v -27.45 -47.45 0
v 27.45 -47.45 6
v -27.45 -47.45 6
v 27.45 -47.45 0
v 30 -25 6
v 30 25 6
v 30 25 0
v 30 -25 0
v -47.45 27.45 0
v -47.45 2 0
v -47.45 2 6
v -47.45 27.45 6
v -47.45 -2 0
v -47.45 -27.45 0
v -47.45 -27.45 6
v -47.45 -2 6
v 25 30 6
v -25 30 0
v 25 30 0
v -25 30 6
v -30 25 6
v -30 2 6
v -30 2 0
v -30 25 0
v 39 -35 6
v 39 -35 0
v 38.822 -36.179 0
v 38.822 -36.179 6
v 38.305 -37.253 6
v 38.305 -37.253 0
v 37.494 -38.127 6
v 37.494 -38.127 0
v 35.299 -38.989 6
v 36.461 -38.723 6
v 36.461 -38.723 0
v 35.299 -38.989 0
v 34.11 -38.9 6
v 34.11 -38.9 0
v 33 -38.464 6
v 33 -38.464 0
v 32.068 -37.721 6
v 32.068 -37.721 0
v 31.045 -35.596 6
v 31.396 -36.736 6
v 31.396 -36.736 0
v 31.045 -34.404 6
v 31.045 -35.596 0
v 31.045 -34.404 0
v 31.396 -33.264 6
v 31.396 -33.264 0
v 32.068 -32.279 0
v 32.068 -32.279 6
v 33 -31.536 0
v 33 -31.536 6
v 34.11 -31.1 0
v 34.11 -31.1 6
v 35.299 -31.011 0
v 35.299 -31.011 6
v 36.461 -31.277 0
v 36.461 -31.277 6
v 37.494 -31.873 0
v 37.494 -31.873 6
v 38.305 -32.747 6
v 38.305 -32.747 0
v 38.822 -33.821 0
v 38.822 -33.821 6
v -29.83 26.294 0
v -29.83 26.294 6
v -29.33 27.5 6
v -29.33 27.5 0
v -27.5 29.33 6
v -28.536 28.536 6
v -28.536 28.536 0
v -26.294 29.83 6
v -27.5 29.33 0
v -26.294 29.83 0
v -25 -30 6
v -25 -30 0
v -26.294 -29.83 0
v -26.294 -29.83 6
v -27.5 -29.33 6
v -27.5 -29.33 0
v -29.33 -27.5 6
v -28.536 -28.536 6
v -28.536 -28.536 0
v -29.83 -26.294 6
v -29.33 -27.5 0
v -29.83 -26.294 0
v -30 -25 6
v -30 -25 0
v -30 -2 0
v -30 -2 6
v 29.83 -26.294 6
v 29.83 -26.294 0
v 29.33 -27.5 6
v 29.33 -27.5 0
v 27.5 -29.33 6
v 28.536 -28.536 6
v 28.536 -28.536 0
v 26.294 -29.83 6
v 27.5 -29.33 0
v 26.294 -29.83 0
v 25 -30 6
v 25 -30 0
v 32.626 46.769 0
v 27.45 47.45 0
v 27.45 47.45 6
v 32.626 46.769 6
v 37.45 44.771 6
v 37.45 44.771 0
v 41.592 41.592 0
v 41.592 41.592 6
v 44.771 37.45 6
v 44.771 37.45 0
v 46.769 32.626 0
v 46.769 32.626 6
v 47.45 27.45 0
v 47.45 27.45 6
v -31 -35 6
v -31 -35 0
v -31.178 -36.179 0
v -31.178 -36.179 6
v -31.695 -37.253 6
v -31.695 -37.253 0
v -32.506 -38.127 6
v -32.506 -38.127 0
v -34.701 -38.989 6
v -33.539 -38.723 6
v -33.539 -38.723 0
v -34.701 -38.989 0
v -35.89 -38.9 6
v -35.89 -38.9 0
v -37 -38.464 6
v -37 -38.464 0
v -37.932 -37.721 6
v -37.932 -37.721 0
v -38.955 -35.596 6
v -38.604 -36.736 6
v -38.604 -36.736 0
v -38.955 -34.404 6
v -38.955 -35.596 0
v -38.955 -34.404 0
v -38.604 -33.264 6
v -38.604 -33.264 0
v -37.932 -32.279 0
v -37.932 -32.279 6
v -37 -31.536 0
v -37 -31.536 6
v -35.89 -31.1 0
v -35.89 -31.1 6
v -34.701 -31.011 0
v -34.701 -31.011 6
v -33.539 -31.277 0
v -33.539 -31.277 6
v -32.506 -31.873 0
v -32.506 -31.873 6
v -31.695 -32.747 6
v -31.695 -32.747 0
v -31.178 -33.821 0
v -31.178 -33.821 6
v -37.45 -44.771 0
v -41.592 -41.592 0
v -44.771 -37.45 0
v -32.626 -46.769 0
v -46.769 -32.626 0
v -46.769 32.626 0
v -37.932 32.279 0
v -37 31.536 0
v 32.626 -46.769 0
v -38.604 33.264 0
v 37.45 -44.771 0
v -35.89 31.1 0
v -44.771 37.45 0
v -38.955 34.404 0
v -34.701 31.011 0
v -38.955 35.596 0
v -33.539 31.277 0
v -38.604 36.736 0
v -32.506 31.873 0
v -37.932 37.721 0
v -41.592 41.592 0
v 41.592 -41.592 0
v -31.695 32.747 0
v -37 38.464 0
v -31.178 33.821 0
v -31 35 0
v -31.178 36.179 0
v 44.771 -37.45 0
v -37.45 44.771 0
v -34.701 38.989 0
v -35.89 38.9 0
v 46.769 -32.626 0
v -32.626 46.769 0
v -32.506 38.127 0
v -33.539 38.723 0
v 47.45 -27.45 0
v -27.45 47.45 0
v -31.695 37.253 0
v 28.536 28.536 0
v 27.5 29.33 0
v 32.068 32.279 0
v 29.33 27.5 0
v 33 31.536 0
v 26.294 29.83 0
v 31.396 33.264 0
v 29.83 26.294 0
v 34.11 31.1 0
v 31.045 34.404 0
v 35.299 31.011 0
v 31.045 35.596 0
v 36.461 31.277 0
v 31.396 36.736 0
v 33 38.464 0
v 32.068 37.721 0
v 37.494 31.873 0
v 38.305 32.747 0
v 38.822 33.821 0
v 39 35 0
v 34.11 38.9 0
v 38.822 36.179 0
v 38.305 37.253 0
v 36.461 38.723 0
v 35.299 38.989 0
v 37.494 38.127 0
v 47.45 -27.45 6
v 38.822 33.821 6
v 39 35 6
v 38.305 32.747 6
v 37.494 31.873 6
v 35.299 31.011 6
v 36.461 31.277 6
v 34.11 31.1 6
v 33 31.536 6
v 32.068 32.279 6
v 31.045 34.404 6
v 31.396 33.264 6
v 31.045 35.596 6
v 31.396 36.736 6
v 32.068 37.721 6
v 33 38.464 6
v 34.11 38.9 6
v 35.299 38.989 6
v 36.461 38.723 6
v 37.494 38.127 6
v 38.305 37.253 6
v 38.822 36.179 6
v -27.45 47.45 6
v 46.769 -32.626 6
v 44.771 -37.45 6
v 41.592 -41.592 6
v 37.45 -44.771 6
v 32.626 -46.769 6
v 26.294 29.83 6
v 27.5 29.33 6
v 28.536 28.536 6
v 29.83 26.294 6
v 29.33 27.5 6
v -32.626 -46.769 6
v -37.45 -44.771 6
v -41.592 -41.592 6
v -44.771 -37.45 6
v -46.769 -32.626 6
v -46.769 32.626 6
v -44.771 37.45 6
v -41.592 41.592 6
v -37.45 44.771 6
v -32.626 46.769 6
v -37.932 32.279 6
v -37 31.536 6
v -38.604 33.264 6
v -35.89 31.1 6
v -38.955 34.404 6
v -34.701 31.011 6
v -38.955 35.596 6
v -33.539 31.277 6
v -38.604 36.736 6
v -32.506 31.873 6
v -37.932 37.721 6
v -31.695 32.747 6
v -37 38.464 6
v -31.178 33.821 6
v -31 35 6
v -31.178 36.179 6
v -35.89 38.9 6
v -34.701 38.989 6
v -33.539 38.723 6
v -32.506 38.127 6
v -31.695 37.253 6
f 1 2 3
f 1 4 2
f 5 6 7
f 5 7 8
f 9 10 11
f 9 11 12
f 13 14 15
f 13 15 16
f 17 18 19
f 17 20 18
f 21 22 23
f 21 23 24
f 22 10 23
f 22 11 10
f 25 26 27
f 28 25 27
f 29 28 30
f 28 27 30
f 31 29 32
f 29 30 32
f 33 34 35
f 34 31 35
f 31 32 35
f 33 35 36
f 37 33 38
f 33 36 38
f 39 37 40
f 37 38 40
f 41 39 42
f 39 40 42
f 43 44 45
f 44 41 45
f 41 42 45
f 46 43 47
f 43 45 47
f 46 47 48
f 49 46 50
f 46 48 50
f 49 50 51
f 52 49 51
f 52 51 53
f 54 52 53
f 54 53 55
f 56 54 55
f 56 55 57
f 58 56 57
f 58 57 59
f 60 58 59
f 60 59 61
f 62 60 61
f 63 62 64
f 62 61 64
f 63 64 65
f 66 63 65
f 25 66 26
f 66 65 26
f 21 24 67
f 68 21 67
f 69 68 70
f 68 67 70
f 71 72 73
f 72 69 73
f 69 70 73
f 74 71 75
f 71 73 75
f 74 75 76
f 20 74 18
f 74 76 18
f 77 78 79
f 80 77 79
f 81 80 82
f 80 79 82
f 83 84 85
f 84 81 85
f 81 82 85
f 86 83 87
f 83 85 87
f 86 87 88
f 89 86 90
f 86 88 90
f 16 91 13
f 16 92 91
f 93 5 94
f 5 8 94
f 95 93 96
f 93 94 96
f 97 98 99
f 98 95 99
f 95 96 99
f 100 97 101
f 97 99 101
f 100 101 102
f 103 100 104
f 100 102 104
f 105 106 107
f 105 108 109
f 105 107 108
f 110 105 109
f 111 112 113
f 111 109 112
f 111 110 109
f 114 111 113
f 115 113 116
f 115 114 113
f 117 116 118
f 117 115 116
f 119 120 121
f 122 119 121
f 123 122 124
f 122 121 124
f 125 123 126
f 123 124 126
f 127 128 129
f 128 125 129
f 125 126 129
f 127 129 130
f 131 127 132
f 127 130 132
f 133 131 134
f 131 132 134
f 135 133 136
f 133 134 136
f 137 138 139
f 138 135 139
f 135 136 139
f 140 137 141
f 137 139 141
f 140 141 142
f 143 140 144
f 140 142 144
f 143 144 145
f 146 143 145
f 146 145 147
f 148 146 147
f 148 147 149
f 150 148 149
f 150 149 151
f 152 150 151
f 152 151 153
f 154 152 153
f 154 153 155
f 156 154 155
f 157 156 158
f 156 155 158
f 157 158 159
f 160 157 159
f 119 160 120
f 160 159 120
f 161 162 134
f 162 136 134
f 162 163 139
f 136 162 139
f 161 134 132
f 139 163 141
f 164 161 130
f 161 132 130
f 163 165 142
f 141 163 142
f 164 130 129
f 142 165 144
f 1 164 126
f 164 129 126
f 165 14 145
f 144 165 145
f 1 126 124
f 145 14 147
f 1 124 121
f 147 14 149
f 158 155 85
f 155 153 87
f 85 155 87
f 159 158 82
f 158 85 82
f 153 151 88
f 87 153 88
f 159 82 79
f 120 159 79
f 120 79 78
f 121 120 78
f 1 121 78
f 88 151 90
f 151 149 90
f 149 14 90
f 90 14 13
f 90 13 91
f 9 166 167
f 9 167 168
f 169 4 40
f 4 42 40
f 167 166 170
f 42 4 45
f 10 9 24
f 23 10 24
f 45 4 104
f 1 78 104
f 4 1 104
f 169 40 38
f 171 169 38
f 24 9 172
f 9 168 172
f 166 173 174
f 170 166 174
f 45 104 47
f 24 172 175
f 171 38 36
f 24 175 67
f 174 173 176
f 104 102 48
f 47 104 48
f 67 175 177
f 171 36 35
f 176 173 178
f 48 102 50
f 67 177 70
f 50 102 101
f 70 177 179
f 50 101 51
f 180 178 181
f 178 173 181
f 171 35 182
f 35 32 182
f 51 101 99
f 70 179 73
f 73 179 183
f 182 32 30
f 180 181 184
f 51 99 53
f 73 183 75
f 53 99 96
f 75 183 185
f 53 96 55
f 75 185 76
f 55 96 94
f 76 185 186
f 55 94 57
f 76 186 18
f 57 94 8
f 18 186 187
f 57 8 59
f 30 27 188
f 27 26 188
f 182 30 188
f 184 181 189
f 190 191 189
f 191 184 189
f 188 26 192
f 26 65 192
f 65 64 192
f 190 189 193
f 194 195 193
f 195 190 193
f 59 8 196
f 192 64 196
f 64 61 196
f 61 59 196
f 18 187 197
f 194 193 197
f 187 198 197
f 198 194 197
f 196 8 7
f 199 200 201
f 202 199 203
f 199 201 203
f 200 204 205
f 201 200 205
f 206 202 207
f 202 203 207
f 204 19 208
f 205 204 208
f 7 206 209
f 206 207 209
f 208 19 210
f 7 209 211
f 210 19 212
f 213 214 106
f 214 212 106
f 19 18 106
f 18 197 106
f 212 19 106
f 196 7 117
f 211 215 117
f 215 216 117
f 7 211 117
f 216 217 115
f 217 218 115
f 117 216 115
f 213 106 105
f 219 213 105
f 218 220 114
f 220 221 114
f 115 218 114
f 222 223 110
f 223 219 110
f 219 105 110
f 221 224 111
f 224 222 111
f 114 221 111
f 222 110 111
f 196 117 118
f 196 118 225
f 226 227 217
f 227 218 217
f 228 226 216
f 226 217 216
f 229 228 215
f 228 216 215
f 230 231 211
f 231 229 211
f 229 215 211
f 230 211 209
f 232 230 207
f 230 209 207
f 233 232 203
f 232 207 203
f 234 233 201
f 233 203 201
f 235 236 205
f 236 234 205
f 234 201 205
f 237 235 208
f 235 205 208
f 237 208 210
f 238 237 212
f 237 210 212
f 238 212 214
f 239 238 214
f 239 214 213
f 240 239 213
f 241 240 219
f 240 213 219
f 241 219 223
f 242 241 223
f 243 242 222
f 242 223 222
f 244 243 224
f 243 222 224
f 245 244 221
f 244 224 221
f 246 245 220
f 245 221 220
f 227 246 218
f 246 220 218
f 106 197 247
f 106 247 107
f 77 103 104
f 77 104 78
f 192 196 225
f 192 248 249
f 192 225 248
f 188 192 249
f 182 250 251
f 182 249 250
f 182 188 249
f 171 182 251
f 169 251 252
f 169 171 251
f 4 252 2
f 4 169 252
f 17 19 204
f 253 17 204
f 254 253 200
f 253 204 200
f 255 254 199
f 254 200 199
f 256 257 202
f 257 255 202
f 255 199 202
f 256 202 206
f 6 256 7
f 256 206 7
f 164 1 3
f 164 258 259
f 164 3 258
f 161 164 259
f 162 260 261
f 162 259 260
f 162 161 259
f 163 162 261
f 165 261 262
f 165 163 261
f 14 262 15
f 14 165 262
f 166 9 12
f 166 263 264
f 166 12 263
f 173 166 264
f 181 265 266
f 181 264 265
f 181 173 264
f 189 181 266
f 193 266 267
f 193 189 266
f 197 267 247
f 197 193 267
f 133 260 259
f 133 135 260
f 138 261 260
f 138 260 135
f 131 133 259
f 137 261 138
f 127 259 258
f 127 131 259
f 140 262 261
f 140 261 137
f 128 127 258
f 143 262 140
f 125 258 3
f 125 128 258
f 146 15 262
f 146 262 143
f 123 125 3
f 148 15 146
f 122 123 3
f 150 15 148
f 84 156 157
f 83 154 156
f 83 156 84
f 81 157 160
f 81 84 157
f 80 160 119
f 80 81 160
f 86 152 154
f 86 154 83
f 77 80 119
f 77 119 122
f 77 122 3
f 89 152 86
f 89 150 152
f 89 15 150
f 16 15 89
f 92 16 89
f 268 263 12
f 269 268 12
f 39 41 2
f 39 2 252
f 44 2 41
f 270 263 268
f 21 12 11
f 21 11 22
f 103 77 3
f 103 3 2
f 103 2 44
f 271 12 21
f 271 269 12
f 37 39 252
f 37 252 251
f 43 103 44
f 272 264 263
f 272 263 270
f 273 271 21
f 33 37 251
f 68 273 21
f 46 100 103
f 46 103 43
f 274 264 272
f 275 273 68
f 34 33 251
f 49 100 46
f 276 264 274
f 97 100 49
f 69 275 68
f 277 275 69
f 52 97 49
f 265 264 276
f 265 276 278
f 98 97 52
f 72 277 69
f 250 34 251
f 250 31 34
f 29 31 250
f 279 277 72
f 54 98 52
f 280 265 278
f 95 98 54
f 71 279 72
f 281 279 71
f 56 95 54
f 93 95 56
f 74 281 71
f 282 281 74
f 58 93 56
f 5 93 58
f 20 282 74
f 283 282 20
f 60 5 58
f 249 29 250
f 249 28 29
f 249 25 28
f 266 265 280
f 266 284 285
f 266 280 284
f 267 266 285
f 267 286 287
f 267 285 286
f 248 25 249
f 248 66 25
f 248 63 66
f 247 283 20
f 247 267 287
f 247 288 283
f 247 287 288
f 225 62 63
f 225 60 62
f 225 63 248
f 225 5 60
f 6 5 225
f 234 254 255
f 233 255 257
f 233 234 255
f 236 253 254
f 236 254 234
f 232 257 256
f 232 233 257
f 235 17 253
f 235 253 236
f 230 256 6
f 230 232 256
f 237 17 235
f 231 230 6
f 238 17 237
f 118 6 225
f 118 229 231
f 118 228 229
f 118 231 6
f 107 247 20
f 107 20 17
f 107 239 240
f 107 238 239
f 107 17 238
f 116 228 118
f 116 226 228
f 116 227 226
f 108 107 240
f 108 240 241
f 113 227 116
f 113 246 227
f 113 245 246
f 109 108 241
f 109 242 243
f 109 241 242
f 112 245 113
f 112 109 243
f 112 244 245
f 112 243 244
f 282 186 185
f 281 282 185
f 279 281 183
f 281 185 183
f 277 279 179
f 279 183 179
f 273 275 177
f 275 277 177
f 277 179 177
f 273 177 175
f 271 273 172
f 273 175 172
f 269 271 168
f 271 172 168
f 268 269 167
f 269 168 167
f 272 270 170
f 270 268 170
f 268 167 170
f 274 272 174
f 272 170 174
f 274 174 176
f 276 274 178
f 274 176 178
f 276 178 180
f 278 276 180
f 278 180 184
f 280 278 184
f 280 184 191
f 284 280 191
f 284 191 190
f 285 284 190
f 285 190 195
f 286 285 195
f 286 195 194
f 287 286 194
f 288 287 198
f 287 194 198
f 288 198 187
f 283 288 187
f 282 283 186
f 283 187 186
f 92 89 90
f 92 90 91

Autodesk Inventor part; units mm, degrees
ref_plane "YZ Plane" through (0, 0, 0) normal (1, 0, 0) x (0, 1, 0)
ref_plane "XZ Plane" through (0, 0, 0) normal (0, 1, 0) x (-1, 0, 0)
ref_plane "XY Plane" through (0, 0, 0) normal (0, 0, 1) x (1, 0, 0)
sketch "Sketch1" plane through (0, 0, 0) normal (0, 0, 1) x (1, 0, 0)
  line L0 (-27.45, -52.45) -> (27.45, -52.45) construction
  line L1 (52.45, -27.45) -> (52.45, 27.45) construction
  line L2 (27.45, 52.45) -> (-27.45, 52.45) construction
  line L3 (-52.45, 27.45) -> (-52.45, -27.45) construction
  line L4 (-52.45, -52.45) -> (52.45, 52.45) construction
  line L5 (52.45, -52.45) -> (-52.45, 52.45) construction
  arc A0 (-27.45, 52.45) -> (-52.45, 27.45) centre (-27.45, 27.45) ccw construction
  arc A1 (-52.45, -27.45) -> (-27.45, -52.45) centre (-27.45, -27.45) ccw construction
  arc A2 (27.45, -52.45) -> (52.45, -27.45) centre (27.45, -27.45) ccw construction
  arc A3 (52.45, 27.45) -> (27.45, 52.45) centre (27.45, 27.45) ccw construction
  line L6 (47.45, 27.45) -> (47.45, -27.45)
  arc A4 (27.45, -47.45) -> (47.45, -27.45) centre (27.45, -27.45) ccw
  line L7 (27.45, -47.45) -> (-27.45, -47.45)
  arc A5 (-47.45, -27.45) -> (-27.45, -47.45) centre (-27.45, -27.45) ccw
  line L8 (-47.45, -27.45) -> (-47.45, 27.45)
  arc A6 (-27.45, 47.45) -> (-47.45, 27.45) centre (-27.45, 27.45) ccw
  line L9 (-27.45, 47.45) -> (27.45, 47.45)
  arc A7 (47.45, 27.45) -> (27.45, 47.45) centre (27.45, 27.45) ccw
  line L10 (-35, 35) -> (35, 35) construction
  line L11 (35, 35) -> (35, -35) construction
  line L12 (35, -35) -> (-35, -35) construction
  line L13 (-35, -35) -> (-35, 35) construction
  line L14 (-35, 35) -> (35, -35) construction
  line L15 (35, 35) -> (-35, -35) construction
  circle A8 centre (35, 35) radius 4
  circle A9 centre (35, -35) radius 4
  circle A10 centre (-35, -35) radius 4
  circle A11 centre (-35, 35) radius 4
  point P0 (0, 0)
  dimension "d0" = 104.9
  dimension "d1" = 104.9
  dimension "d2" = 25
  dimension "d6" = 5
  dimension "d12" = 70
  dimension "d13" = 8
extrude "Extrusion1" add sketch "Sketch1" along normal blind 6
sketch "Sketch2" plane through (0, 0, 6) normal (0, 0, 1) x (1, 0, 0)
  line L0 (-30, 30) -> (30, 30)
  line L1 (30, 30) -> (30, -30)
  line L2 (30, -30) -> (-30, -30)
  line L3 (-30, 30) -> (30, -30) construction
  line L4 (30, 30) -> (-30, -30) construction
  line L5 (-64.9, 2) -> (-30, 2)
  line L6 (-30, -2) -> (-64.9, -2)
  line L7 (-64.9, -2) -> (-64.9, 2)
  line L8 (-47.45, 27.45) -> (-47.45, -27.45) projected
  line L9 (-64.9, 2) -> (-30, -2) construction
  line L10 (-30, 2) -> (-64.9, -2) construction
  line L11 (-30, -30) -> (-30, -2)
  line L12 (-30, 2) -> (-30, 30)
  point P0 (0, 0)
  point P1 (-47.45, 0)
  dimension "d7" = 4
  dimension "d8" = 60
  dimension "d9" = 60
extrude "Extrusion2" cut sketch "Sketch2" against normal blind 10
fillet "Fillet1" radius 5 4 edges at (30, 30, 3) (-30, 30, 3) (30, -30, 3) (-30, -30, 3)
equation "\"d1\" = d0"
equation "\"d8\" = d9"
properties part number "NewFront_E"
